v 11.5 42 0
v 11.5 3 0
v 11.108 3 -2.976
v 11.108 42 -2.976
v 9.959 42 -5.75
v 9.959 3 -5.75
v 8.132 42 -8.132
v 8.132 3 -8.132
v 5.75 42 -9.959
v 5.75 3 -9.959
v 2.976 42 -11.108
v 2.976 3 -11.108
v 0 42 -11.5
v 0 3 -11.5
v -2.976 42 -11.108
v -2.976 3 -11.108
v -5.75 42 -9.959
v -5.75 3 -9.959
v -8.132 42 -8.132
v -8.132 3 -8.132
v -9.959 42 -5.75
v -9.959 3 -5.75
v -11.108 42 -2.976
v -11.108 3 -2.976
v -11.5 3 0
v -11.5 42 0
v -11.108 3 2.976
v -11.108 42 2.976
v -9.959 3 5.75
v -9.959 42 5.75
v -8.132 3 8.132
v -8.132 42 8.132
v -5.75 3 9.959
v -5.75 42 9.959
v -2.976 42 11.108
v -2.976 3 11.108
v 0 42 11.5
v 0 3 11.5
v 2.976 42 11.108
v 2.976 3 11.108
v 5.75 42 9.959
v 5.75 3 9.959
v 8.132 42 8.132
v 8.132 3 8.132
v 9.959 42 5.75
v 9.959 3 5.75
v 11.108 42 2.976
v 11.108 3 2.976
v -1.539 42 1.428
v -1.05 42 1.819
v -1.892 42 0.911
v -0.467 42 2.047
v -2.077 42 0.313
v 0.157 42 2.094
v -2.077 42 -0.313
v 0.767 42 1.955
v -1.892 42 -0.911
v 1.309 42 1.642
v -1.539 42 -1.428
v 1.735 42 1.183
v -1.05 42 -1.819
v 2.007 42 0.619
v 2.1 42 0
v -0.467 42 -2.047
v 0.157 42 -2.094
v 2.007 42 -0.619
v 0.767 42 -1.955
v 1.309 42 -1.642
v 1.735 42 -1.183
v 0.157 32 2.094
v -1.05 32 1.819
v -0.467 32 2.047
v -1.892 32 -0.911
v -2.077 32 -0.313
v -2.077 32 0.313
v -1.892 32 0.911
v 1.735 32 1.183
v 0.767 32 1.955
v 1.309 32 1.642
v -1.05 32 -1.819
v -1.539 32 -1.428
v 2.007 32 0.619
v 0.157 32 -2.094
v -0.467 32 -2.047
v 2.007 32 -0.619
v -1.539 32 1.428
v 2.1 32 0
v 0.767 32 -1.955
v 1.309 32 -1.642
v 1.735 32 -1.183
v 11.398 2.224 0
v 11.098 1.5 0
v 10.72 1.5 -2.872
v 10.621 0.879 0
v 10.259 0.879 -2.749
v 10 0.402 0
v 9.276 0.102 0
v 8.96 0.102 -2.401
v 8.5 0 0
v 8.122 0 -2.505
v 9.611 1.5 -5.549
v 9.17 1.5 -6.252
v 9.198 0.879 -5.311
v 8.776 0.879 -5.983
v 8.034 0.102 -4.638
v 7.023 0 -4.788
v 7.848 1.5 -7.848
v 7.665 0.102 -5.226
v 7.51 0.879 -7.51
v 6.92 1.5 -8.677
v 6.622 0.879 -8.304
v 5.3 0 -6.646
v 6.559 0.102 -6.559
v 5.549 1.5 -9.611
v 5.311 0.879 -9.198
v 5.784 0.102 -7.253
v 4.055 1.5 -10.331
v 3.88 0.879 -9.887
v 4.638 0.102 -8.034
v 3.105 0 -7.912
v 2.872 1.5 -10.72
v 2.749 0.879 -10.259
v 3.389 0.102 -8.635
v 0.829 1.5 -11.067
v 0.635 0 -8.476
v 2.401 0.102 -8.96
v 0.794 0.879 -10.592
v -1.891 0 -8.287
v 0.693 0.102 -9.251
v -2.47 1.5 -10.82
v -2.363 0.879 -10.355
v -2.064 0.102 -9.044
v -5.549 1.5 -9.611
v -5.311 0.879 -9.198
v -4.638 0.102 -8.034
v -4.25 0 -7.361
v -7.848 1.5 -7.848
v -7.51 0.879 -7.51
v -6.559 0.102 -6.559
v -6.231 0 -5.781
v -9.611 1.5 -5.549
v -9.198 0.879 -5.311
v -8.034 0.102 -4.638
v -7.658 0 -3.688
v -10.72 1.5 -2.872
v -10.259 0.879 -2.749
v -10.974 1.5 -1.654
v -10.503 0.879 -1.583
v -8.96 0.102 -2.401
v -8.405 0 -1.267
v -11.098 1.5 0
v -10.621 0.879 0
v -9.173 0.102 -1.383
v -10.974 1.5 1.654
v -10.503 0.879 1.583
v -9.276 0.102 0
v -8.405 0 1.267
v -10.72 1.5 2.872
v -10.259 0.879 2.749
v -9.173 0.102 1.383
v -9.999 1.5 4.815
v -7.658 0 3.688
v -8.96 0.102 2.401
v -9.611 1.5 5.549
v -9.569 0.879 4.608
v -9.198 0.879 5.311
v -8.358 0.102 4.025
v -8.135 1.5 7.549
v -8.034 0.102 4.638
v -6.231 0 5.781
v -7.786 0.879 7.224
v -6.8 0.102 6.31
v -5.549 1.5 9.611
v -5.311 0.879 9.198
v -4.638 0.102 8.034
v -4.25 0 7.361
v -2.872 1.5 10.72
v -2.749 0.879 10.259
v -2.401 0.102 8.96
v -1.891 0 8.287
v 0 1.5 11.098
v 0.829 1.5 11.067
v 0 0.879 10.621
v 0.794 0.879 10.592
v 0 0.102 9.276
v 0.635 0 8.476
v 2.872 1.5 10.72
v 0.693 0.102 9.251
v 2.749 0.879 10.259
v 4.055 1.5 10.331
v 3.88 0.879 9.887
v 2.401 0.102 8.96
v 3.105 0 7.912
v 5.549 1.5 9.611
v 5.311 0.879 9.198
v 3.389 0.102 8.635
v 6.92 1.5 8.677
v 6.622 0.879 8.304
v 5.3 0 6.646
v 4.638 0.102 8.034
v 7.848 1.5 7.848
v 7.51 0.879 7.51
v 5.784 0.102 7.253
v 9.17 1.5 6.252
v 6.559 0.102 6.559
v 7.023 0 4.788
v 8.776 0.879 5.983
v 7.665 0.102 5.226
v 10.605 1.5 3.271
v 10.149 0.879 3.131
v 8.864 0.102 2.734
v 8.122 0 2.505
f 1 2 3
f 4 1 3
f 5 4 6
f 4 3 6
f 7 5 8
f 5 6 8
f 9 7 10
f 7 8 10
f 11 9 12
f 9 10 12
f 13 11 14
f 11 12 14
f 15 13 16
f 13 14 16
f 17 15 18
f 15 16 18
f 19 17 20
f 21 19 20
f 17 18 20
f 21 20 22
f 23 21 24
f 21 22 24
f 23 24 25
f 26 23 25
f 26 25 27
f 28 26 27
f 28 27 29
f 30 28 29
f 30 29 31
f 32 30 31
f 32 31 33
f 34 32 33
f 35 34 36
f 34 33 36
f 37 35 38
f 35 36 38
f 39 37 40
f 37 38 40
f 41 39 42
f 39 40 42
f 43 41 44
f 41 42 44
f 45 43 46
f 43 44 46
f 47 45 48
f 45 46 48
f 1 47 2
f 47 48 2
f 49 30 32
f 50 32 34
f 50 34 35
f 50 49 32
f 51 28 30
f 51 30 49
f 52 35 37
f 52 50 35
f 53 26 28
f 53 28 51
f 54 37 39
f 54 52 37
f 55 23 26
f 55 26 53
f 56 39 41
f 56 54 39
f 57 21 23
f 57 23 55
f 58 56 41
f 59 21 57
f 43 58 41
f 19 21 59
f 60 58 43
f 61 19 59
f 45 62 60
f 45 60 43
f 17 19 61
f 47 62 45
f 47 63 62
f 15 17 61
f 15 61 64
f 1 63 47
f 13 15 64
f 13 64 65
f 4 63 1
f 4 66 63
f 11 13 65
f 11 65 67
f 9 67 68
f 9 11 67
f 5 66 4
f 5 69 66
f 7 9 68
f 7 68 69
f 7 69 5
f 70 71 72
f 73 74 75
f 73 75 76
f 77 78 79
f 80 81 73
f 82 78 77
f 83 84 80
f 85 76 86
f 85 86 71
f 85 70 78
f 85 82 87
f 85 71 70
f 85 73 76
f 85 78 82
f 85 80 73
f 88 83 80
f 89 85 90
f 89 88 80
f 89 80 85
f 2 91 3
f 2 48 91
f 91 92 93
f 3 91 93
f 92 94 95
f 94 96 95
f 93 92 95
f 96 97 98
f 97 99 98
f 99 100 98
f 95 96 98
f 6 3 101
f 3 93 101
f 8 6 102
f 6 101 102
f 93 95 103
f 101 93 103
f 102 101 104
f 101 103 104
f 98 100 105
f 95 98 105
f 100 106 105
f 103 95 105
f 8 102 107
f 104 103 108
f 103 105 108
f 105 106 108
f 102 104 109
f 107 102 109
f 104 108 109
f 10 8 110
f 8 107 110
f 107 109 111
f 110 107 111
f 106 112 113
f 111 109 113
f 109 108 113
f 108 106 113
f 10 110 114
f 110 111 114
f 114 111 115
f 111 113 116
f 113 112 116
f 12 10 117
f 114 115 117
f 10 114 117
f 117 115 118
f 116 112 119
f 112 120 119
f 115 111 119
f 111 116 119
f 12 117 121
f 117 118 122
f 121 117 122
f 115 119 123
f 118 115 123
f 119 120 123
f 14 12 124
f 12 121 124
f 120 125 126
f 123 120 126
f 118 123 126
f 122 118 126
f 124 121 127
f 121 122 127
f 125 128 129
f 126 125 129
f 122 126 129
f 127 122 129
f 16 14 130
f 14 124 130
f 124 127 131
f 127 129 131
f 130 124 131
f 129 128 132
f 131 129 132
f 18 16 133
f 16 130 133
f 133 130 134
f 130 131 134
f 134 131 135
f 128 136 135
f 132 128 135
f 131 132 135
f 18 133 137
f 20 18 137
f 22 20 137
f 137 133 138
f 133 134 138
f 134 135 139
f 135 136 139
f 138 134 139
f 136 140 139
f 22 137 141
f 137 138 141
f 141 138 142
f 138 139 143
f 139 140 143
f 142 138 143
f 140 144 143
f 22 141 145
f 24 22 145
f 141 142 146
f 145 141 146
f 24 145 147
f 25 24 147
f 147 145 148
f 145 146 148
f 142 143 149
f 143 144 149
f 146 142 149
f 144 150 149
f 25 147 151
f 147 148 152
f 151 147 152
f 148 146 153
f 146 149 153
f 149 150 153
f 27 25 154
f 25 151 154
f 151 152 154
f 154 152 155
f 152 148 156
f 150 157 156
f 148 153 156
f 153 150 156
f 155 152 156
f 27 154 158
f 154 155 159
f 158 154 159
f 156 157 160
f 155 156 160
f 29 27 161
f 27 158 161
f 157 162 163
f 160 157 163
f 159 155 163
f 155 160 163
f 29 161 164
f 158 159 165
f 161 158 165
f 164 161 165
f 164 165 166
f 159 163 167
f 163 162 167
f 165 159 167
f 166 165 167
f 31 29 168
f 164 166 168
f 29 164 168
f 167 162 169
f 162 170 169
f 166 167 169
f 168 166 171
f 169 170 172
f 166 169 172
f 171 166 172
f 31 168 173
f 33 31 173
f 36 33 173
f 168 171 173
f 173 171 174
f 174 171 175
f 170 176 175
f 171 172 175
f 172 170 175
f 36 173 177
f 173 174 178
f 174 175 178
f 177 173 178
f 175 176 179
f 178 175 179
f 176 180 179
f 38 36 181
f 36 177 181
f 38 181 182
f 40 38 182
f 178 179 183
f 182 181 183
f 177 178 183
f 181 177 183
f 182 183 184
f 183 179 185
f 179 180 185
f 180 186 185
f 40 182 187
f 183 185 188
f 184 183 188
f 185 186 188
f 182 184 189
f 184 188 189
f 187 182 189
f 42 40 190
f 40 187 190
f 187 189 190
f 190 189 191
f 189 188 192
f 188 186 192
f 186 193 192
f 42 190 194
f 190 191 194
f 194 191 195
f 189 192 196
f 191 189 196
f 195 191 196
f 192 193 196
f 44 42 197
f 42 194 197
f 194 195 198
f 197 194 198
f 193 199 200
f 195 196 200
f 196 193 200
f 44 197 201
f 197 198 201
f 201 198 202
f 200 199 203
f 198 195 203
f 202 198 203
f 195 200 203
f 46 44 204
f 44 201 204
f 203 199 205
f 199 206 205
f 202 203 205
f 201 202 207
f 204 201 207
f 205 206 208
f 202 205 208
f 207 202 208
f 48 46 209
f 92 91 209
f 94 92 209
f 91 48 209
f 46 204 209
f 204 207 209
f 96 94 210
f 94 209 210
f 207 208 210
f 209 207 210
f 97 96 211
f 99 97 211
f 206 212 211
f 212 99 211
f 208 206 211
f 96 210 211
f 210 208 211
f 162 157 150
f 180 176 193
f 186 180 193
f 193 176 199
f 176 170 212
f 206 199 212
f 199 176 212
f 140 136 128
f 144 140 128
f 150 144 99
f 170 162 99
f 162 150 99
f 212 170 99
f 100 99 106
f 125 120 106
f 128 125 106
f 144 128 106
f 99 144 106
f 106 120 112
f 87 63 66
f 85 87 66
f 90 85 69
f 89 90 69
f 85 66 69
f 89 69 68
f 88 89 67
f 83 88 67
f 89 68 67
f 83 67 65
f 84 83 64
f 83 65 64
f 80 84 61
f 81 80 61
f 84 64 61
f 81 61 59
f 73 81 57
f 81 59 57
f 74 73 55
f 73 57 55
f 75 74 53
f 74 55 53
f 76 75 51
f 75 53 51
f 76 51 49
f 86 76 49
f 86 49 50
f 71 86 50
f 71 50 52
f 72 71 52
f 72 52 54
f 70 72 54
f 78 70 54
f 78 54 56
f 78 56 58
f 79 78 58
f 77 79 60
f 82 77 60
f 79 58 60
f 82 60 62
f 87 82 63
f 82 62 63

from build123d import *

# Parameters (mm, degrees)
SKETCH1_R           = 11.5
BOSS_EXTRUDE1_DEPTH = 42
FILLET1_R           = 3
SKETCH3_R           = 2.1
CUT_EXTRUDE1_DEPTH  = 10


with BuildPart() as part:
    # Sketch1 → Boss-Extrude1 (new body)
    with BuildSketch(Plane(origin=(0, 0, 0), x_dir=(1, 0, 0), z_dir=(0, 1, 0))):
        Circle(SKETCH1_R)
    extrude(amount=BOSS_EXTRUDE1_DEPTH)

    # Fillet1
    fillet1_edges = [part.edges().sort_by_distance(p)[0] for p in [
        (-11.5, 0, 0),
    ]]
    fillet(fillet1_edges, radius=FILLET1_R)

    # Sketch3 → Cut-Extrude1 (cut)
    with BuildSketch(Plane(origin=(0, 42, 0), x_dir=(1, 0, 0), z_dir=(0, 1, 0))):
        Circle(SKETCH3_R)
    extrude(amount=-CUT_EXTRUDE1_DEPTH, mode=Mode.SUBTRACT)


solid = part.part
